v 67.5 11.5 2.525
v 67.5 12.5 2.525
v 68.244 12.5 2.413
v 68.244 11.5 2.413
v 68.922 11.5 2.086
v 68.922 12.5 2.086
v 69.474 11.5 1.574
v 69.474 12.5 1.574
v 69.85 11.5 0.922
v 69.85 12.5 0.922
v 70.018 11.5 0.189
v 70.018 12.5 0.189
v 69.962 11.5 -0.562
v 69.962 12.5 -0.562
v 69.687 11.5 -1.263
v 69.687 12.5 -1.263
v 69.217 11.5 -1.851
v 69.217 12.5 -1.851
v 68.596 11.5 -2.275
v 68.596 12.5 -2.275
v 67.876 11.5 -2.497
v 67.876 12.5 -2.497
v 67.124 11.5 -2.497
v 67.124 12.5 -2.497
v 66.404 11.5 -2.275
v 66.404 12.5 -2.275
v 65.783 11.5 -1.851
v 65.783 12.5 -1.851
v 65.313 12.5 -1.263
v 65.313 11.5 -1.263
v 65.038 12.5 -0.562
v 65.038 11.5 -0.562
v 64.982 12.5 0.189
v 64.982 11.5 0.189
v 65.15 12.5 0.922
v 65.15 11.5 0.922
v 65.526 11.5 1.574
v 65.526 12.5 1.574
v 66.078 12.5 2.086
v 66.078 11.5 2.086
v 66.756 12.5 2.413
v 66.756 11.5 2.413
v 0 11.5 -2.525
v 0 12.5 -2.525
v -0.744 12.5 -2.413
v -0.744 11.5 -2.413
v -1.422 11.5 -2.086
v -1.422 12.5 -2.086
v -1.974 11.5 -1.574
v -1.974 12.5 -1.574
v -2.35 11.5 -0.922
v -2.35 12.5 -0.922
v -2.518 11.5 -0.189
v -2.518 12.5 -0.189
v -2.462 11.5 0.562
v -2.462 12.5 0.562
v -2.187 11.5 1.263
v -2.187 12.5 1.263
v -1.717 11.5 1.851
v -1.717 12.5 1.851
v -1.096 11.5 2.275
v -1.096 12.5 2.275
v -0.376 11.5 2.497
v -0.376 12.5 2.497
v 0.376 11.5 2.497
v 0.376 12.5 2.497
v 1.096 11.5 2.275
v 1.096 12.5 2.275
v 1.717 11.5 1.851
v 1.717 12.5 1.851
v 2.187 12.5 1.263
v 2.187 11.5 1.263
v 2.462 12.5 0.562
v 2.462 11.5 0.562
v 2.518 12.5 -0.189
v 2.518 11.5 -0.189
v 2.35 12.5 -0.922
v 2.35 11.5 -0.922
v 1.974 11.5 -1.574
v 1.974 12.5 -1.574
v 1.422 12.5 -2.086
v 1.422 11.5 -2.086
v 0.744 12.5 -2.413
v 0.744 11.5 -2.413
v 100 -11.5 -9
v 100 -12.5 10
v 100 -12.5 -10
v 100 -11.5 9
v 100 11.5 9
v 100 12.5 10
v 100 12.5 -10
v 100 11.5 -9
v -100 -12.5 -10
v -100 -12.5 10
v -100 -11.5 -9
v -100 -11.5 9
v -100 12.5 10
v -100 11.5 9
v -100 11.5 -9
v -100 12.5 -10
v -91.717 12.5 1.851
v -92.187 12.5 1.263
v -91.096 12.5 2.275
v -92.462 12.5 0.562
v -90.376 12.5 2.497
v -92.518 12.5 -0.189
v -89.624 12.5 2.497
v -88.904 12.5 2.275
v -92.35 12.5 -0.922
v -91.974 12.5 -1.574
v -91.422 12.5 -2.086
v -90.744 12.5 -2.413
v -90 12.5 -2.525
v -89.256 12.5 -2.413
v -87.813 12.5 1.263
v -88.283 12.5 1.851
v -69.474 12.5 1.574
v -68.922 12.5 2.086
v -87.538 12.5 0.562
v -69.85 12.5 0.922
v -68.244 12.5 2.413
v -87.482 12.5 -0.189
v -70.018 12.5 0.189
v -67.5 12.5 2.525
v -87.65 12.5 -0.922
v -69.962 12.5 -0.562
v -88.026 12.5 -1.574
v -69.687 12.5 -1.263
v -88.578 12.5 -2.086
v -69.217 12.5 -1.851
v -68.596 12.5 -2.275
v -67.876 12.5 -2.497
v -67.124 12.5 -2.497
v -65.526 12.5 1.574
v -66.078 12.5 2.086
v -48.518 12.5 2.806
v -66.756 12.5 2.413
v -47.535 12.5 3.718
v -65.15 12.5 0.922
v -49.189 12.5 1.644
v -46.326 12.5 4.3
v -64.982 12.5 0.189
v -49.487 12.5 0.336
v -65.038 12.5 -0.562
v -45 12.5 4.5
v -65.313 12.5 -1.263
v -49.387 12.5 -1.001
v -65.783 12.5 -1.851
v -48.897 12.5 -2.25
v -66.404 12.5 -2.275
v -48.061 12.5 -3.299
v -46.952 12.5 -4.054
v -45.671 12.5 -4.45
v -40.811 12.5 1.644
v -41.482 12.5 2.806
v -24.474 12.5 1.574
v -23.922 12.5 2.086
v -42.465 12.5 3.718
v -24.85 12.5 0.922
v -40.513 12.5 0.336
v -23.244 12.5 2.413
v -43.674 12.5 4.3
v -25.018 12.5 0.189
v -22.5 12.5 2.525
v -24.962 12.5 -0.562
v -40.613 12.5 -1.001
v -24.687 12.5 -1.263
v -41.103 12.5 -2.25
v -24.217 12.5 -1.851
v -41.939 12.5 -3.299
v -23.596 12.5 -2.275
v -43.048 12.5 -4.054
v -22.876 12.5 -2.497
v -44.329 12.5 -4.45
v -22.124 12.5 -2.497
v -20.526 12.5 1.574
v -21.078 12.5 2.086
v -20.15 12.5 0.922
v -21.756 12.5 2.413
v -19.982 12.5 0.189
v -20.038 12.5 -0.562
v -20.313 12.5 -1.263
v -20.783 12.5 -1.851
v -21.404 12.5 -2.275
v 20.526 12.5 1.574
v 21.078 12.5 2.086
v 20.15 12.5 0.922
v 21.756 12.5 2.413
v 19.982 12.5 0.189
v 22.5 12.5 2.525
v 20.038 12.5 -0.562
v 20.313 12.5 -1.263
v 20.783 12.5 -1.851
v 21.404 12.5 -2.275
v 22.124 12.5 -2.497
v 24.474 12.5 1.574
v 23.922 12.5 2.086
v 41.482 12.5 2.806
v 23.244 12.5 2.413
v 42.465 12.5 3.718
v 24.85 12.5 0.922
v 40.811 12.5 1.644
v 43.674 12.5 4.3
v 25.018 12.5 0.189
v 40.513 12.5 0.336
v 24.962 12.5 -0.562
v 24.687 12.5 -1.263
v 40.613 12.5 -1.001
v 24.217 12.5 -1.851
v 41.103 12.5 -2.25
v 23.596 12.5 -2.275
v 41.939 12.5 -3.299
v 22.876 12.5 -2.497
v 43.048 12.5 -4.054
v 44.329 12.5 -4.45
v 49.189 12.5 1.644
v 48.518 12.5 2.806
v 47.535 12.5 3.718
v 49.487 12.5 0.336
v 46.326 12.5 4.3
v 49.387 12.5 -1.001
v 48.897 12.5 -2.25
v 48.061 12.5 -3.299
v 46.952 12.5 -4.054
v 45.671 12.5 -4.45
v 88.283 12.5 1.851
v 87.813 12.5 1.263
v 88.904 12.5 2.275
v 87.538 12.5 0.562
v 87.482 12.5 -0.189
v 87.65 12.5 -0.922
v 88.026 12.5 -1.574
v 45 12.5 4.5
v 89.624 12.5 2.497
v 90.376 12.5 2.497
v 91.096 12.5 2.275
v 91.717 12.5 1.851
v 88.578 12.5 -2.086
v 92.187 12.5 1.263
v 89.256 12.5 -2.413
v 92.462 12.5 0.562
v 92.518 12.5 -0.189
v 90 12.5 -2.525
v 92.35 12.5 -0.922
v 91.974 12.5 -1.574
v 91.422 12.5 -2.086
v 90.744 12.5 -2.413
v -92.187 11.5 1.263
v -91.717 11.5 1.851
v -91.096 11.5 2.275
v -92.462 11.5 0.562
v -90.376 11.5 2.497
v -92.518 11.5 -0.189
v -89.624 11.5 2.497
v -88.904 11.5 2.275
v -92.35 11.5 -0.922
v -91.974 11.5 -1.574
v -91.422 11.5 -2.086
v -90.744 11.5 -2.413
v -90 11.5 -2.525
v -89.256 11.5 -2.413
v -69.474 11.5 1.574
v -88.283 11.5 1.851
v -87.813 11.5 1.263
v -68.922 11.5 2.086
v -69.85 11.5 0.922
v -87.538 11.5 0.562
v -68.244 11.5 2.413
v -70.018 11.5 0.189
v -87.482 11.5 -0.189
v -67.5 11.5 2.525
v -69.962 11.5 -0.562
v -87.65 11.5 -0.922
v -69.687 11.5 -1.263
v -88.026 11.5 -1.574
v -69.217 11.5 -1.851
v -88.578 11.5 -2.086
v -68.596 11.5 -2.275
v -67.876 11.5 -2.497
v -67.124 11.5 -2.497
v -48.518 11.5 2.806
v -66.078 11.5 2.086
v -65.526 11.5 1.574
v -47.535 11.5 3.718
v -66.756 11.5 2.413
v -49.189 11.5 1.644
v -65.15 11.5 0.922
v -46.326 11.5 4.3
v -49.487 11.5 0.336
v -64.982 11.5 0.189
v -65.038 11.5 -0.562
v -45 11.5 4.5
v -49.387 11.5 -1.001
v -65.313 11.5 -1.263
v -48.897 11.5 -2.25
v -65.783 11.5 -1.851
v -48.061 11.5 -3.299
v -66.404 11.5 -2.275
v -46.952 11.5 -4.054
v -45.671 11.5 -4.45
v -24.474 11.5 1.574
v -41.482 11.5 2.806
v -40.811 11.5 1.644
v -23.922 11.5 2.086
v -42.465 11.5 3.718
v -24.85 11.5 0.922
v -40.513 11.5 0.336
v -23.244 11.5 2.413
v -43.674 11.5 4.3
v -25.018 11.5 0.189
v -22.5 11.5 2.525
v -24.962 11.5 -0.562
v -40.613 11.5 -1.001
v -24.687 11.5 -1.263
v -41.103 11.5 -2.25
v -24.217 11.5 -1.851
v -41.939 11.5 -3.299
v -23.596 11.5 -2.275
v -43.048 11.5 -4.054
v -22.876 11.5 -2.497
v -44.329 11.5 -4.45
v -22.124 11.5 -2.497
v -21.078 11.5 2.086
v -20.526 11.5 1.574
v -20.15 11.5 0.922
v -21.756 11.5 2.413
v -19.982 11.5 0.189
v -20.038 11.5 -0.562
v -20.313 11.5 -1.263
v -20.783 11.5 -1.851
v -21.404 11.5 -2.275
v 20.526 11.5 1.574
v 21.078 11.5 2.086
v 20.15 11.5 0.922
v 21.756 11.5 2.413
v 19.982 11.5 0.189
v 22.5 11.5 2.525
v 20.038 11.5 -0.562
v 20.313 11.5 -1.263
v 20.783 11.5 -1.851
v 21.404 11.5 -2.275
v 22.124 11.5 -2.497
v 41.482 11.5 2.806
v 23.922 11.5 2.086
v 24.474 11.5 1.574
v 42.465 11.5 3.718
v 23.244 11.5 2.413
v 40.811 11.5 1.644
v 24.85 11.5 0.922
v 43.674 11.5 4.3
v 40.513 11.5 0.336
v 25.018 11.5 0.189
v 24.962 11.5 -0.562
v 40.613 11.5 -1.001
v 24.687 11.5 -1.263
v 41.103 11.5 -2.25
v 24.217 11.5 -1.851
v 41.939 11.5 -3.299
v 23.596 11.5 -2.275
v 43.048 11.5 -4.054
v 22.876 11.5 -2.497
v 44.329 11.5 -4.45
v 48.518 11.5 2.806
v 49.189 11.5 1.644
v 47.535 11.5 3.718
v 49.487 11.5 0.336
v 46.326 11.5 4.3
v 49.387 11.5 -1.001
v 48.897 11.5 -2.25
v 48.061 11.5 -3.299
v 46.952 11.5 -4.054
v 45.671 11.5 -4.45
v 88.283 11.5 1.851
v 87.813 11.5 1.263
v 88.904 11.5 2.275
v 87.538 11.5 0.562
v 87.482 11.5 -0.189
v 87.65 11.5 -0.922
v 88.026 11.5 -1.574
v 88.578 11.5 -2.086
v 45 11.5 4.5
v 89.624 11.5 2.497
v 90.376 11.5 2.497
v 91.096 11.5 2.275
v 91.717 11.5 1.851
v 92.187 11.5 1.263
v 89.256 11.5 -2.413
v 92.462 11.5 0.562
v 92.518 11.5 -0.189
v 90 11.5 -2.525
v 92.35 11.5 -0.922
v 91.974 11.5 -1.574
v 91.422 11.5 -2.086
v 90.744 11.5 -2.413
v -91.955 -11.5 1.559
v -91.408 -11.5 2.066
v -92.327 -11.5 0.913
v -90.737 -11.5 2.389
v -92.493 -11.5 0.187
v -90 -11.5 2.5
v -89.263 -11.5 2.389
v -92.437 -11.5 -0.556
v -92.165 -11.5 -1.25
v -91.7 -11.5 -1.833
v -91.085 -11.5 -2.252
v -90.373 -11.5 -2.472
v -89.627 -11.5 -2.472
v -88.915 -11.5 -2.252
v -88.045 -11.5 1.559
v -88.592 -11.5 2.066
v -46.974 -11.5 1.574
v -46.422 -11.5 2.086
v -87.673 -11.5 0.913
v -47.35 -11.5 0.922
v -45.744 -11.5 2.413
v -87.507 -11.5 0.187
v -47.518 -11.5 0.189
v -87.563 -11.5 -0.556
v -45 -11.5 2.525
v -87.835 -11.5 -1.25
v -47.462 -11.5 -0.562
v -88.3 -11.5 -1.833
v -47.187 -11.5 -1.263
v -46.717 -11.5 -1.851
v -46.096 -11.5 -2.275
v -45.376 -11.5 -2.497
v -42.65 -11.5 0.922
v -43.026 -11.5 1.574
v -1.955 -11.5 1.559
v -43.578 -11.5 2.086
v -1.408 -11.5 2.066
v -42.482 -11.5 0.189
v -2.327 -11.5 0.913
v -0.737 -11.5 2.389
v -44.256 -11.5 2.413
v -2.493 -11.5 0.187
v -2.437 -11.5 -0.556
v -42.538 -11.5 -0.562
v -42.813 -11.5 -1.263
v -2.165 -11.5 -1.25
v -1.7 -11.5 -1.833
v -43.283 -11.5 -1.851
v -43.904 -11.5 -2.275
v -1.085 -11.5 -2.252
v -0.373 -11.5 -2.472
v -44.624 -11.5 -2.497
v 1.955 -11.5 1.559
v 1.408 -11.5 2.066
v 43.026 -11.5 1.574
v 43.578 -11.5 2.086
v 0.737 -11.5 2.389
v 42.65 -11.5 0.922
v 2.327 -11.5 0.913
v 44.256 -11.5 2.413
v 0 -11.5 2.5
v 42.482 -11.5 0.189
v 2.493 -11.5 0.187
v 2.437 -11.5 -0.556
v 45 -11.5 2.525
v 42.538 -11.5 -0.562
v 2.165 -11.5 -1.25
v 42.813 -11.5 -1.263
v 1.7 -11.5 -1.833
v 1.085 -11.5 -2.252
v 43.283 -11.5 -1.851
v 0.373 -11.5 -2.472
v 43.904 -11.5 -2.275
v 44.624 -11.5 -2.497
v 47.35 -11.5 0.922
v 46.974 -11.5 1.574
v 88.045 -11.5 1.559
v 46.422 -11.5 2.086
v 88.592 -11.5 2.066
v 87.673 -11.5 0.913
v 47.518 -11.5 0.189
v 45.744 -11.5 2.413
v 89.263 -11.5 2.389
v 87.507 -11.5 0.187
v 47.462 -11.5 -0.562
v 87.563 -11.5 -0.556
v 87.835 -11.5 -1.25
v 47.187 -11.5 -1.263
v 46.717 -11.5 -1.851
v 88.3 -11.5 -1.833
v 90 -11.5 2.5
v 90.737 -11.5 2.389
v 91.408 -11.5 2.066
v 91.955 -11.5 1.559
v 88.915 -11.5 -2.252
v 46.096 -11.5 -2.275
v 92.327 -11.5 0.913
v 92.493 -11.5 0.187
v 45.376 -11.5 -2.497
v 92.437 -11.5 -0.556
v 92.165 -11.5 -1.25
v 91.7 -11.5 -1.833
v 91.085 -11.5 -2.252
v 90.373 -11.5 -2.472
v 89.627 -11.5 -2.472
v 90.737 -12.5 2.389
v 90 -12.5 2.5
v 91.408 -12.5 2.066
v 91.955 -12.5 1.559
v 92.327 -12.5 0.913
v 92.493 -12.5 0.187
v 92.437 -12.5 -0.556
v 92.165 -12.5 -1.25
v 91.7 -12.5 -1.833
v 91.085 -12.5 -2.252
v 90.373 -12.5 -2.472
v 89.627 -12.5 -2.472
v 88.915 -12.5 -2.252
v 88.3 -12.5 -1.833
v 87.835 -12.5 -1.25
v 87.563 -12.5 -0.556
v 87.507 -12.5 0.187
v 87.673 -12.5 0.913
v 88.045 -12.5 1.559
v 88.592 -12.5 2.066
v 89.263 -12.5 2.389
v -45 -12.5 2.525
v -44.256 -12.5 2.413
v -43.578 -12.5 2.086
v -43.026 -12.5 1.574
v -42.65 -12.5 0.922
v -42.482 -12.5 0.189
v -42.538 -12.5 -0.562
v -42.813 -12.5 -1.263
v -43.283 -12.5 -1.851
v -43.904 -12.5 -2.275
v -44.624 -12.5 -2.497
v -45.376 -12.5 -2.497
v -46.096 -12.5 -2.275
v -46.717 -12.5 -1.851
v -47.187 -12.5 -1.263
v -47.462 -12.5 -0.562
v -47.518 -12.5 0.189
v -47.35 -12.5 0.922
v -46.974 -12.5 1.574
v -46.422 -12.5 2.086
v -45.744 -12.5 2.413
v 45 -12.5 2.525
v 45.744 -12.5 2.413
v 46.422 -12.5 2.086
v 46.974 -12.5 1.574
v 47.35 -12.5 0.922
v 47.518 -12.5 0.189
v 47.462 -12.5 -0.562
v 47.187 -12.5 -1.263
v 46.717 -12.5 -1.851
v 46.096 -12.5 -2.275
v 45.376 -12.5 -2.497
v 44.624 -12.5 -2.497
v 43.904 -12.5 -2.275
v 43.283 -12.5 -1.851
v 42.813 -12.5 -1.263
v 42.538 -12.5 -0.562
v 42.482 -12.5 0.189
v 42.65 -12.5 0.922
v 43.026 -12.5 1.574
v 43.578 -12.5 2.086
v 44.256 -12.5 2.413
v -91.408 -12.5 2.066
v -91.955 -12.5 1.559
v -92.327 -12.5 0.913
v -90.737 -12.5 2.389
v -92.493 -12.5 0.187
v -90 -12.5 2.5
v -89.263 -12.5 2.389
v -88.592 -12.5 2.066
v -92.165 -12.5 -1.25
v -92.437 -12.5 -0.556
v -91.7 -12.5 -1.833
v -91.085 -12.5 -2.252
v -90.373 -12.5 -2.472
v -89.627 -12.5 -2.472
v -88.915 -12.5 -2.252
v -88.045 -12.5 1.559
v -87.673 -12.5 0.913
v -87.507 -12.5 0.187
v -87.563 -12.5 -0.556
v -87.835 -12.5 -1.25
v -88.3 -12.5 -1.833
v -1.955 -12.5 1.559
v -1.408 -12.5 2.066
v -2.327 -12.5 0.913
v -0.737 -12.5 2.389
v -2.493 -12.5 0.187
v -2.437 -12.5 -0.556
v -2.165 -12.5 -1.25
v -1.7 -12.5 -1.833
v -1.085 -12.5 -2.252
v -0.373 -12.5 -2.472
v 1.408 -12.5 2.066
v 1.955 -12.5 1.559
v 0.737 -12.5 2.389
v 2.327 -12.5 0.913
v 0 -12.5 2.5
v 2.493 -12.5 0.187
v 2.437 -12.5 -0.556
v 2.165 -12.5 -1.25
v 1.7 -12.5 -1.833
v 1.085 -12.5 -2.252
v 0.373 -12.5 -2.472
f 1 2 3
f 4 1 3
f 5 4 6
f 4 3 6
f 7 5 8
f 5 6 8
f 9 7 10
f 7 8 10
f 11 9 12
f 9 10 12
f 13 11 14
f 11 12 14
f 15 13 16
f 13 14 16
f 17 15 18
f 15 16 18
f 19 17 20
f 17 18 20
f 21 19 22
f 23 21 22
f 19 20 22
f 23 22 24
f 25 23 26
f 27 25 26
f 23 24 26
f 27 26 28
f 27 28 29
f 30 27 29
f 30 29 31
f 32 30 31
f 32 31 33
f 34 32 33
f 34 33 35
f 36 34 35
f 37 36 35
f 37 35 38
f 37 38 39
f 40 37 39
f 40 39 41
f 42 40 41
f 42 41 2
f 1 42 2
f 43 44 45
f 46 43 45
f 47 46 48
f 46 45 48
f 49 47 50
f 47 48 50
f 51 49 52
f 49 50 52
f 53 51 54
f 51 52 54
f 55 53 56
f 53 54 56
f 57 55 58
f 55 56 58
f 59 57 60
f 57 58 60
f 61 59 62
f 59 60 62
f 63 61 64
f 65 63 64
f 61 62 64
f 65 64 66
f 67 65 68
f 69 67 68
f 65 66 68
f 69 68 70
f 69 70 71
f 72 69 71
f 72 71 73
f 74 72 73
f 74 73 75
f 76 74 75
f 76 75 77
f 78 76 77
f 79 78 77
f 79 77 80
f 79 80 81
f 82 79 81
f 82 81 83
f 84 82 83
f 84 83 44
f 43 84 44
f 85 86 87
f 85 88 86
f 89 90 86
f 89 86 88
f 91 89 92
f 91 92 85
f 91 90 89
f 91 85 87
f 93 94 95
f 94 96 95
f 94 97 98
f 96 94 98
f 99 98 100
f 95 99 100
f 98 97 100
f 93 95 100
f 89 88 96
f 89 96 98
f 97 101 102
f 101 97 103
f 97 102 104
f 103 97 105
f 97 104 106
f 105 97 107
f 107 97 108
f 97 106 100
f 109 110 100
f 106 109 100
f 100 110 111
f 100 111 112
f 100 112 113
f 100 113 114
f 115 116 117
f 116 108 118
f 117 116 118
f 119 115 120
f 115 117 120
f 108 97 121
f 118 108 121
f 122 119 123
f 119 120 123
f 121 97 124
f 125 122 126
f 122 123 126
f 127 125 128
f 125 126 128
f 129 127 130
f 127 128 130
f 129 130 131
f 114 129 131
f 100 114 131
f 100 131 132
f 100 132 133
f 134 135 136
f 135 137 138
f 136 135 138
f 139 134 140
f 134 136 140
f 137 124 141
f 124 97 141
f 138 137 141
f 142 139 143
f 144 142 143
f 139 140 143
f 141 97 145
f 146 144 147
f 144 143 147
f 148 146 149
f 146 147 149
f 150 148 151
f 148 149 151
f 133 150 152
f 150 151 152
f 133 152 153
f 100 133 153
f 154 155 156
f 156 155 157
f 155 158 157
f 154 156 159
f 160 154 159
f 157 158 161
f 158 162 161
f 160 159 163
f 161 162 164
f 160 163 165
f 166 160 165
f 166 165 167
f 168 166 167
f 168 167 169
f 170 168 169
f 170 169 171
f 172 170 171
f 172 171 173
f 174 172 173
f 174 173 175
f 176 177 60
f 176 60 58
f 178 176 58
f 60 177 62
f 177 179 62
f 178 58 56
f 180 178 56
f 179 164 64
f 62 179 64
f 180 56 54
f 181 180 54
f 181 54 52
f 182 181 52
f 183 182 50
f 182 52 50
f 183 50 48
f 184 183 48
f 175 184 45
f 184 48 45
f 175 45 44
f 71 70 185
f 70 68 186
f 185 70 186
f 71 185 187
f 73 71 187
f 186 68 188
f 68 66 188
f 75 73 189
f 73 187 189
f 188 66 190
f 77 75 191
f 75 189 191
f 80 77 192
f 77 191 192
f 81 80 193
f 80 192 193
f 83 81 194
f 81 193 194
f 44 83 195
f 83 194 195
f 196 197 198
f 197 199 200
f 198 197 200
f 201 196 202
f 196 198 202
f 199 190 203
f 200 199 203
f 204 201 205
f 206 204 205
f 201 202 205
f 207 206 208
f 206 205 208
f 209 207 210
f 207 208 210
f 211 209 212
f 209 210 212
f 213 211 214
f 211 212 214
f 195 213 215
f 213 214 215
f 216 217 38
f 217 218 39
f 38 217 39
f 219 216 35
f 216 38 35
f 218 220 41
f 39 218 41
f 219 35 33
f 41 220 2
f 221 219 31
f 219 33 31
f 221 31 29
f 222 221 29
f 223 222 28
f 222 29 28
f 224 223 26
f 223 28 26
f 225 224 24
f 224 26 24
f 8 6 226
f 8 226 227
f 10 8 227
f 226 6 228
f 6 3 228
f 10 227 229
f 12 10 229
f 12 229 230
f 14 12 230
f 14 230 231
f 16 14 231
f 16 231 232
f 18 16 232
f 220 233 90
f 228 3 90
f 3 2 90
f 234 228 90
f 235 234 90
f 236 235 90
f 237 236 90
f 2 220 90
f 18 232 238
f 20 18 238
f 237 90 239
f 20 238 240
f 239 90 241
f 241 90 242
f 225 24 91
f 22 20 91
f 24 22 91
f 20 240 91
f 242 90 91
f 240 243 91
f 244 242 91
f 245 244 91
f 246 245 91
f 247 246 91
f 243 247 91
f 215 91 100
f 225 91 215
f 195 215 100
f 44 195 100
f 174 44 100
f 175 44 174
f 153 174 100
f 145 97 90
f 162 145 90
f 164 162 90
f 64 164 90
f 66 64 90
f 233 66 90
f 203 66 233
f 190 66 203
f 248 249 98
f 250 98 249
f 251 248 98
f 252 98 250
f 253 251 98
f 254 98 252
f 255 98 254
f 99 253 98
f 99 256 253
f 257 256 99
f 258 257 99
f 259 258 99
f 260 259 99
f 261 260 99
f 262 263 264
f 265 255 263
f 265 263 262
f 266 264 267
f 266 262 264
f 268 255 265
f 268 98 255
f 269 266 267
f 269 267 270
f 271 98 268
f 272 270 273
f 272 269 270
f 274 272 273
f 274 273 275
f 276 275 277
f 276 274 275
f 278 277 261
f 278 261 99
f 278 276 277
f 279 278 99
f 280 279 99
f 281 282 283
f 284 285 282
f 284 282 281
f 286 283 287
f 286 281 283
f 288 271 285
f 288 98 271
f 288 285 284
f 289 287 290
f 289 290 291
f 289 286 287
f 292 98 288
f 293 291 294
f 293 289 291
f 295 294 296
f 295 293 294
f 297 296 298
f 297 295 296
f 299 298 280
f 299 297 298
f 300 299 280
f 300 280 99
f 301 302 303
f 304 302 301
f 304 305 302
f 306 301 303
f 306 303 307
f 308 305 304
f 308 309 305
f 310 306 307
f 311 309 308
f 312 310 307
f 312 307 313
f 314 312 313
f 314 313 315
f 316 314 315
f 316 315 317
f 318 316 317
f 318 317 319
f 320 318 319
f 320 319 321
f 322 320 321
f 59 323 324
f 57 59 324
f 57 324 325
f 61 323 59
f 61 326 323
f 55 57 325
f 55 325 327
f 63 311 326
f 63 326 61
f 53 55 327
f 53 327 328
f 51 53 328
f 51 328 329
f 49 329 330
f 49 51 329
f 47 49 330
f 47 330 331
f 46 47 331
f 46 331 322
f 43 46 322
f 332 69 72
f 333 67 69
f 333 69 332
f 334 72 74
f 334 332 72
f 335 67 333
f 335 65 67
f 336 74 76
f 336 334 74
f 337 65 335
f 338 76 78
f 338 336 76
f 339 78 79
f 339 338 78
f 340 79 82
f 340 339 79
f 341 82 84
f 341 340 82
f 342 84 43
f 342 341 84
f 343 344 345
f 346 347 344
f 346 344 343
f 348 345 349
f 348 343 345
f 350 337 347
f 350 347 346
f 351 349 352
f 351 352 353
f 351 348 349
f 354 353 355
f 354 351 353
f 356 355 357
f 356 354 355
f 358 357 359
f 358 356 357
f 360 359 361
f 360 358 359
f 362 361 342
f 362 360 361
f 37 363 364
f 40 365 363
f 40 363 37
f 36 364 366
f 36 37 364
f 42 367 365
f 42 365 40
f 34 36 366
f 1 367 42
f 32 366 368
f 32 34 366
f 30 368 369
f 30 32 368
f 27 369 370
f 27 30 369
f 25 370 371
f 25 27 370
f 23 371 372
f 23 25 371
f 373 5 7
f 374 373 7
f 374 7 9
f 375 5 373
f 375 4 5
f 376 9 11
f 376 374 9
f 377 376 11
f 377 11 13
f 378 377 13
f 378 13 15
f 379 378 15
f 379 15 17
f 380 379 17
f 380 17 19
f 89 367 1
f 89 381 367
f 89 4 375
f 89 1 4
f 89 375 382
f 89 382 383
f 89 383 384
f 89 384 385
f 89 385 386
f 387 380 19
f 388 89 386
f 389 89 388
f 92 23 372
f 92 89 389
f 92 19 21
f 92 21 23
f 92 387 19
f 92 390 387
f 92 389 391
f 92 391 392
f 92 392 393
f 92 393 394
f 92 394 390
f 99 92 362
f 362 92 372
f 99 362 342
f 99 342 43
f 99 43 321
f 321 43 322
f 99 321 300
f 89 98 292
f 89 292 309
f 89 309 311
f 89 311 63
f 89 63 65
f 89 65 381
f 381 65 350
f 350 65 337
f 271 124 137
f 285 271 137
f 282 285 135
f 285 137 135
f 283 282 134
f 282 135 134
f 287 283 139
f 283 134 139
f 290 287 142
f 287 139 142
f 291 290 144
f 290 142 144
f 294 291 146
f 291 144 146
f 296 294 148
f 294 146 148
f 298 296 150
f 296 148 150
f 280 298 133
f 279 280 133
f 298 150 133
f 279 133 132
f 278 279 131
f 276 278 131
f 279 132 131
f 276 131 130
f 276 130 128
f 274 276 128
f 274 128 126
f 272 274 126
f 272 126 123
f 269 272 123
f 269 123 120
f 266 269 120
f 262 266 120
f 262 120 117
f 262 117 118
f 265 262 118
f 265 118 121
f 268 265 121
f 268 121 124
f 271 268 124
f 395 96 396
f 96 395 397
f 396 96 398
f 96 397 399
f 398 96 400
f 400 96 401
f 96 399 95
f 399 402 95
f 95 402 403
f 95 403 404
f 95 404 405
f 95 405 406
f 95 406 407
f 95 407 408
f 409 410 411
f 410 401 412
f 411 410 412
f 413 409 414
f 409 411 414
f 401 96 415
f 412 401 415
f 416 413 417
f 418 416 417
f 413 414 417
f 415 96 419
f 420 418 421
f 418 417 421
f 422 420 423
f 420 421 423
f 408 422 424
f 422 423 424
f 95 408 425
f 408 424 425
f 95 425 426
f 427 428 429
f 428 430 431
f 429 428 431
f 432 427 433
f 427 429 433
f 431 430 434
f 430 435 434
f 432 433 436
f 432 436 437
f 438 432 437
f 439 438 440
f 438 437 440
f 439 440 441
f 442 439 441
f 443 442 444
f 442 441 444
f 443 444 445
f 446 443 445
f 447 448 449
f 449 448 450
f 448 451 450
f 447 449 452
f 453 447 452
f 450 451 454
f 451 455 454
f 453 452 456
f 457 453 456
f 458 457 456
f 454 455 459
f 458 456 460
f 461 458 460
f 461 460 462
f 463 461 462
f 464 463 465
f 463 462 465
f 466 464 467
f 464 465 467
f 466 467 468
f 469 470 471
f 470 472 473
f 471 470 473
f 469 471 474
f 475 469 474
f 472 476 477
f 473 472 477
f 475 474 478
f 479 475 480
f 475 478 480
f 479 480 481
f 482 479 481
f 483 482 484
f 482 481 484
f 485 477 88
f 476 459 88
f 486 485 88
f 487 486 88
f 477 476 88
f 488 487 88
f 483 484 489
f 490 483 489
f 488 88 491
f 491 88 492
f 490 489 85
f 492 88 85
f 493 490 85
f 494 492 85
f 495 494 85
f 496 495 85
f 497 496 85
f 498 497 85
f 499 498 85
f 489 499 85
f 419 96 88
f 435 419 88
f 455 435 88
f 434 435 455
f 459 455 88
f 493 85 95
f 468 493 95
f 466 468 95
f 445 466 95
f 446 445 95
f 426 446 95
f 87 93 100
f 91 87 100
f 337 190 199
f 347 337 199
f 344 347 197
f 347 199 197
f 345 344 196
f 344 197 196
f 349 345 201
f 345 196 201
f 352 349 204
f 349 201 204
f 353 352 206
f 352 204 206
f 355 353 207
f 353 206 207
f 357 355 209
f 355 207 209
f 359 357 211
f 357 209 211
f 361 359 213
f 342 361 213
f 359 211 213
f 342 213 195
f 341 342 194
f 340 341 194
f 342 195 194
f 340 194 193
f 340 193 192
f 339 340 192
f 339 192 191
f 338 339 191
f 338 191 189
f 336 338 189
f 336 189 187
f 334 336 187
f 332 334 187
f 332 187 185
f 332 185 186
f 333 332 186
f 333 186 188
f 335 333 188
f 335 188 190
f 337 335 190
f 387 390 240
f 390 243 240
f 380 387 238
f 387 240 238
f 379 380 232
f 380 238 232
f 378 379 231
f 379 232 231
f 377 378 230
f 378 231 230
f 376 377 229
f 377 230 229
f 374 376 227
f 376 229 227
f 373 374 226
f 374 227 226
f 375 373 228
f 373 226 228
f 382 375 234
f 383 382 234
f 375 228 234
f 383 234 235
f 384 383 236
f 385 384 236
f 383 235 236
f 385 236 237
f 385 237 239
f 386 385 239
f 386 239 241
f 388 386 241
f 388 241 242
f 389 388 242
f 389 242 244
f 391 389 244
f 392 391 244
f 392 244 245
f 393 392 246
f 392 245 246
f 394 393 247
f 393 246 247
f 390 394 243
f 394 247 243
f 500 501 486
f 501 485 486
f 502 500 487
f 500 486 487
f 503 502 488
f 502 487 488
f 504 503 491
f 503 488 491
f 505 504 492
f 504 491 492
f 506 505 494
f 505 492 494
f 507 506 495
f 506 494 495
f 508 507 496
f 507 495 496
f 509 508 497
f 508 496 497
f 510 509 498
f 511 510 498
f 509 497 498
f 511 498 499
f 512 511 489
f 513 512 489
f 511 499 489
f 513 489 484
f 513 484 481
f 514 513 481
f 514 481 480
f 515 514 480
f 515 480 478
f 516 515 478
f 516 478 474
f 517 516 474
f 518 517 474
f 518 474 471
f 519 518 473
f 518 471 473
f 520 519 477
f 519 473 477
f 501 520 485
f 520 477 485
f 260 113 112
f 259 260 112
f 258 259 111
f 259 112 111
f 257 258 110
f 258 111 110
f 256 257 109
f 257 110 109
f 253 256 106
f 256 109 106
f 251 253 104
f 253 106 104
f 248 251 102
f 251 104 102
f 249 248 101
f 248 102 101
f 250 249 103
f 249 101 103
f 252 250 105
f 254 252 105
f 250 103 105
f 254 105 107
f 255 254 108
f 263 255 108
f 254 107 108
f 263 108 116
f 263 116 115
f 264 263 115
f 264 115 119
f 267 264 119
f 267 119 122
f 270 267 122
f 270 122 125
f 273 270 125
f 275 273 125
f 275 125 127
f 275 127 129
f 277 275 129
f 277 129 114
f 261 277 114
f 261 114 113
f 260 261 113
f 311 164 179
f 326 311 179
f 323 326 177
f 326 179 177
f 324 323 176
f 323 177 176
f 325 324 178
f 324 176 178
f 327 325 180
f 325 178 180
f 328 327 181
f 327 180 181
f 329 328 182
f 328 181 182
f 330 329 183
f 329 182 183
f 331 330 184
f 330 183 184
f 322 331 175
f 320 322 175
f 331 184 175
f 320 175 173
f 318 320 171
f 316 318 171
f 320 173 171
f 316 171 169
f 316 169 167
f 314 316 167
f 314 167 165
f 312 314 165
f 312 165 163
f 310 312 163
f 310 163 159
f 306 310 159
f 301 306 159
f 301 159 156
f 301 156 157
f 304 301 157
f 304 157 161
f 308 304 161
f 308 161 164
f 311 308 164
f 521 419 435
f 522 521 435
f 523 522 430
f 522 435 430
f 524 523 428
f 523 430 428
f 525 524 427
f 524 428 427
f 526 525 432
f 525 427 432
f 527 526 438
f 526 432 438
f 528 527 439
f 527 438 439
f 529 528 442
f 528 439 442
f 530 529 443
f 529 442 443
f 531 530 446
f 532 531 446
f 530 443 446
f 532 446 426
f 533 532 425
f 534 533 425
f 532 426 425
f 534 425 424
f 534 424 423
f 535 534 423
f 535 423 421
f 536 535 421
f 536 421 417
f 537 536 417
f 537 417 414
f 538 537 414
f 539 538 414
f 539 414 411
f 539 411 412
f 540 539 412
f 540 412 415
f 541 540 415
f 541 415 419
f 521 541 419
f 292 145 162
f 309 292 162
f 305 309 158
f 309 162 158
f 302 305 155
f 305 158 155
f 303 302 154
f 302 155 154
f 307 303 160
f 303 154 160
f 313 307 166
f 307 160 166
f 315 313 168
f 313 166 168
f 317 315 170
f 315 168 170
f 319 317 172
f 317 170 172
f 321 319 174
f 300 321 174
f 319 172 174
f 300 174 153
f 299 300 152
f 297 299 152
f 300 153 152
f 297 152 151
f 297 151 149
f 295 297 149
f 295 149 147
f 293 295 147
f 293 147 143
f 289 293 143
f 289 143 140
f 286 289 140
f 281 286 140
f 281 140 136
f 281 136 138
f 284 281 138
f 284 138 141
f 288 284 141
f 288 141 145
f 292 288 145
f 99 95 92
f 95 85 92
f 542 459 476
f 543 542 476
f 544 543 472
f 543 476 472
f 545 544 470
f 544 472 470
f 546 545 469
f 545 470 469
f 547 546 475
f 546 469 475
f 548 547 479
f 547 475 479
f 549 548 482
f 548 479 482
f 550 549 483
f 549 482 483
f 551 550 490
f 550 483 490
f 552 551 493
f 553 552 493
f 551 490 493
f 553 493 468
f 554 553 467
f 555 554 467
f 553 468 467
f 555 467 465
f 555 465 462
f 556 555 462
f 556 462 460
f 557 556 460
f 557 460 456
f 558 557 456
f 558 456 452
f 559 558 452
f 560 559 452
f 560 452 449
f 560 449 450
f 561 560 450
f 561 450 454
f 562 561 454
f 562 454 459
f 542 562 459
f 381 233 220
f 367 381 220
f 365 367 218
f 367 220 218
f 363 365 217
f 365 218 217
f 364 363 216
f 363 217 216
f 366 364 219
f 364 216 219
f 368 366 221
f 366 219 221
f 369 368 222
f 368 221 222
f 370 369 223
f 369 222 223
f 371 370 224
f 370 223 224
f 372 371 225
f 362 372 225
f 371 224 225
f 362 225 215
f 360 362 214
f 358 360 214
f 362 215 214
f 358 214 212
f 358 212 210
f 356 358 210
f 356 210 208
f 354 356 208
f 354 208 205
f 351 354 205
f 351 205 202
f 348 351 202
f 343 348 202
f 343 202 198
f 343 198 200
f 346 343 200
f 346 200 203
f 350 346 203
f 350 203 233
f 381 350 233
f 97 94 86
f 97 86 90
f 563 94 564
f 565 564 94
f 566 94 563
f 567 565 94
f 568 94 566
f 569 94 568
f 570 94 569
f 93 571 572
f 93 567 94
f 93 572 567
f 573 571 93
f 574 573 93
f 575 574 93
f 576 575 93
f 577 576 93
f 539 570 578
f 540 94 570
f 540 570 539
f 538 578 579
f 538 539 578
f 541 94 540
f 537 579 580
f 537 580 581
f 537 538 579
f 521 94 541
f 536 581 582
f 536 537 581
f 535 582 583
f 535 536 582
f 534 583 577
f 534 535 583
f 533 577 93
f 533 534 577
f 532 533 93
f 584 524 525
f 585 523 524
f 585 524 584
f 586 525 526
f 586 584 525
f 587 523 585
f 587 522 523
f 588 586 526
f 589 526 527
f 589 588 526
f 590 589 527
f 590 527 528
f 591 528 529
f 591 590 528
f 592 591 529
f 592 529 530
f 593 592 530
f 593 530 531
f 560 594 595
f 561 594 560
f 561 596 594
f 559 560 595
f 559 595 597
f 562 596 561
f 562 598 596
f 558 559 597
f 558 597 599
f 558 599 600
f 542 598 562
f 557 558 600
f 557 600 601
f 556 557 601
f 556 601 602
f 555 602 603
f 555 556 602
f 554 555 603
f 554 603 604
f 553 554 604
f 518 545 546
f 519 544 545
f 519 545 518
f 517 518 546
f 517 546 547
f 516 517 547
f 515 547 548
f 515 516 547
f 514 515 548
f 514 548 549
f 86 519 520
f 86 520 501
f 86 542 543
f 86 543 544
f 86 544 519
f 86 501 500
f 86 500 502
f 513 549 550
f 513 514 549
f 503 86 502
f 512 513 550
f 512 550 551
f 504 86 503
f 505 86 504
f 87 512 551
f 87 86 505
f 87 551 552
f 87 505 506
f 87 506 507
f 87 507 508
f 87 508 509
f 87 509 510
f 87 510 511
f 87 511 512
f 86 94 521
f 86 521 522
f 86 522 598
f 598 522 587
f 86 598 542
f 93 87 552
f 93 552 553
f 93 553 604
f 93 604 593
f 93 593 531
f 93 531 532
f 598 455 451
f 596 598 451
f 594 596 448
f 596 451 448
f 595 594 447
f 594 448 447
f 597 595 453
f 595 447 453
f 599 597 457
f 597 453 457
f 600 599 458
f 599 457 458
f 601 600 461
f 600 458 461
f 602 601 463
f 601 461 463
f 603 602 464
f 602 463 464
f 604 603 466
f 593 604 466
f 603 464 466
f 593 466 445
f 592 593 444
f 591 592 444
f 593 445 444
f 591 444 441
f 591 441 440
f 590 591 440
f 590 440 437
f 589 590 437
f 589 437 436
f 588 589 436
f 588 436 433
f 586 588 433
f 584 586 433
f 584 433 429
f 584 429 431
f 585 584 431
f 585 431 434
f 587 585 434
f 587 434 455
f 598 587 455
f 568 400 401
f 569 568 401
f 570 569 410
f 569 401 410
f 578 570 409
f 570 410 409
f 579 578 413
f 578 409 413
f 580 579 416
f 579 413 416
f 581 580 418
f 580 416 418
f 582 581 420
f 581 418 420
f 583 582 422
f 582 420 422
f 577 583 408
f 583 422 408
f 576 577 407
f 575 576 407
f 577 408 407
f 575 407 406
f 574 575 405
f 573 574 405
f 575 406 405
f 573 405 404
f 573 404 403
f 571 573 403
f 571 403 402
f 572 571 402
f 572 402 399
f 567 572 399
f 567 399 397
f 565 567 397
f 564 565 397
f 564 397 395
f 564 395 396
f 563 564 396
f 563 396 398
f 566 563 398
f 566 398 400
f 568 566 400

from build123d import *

# Parameters (mm, degrees)
SKETCH_1_W          = 20
SKETCH_1_H          = 25
SKETCH_1_W_2        = 18
SKETCH_1_H_2        = 23
EXTRUDE_1_DEPTH     = 100
SKETCH_2_R          = 2.525
CUT_EXTRUDE_1_DEPTH = 5
SKETCH_4_R          = 2.5
CUT_EXTRUDE_3_DEPTH = 5
SKETCH_5_R          = 4.5
CUT_EXTRUDE_4_DEPTH = 2
SKETCH_6_R          = 2.525
CUT_EXTRUDE_5_DEPTH = 2
SKETCH_7_R          = 2.525
CUT_EXTRUDE_6_DEPTH = 10


with BuildPart() as part:
    # 草图1 → 凸台-拉伸1 (new, symmetric)
    with BuildSketch(Plane(origin=(0, 0, 0), x_dir=(0, 0, -1), z_dir=(1, 0, 0))):
        Rectangle(SKETCH_1_W, SKETCH_1_H)
        Rectangle(SKETCH_1_W_2, SKETCH_1_H_2, mode=Mode.SUBTRACT)
    extrude(amount=EXTRUDE_1_DEPTH, both=True)

    # 草图2 → 切除-拉伸1 (cut, symmetric)
    with BuildSketch(Plane(origin=(0, 12.5, 0), x_dir=(1, 0, 0), z_dir=(0, 1, 0))):
        with Locations(Location((0, 0, 0), (0, 0, 90))):
            Circle(SKETCH_2_R)
        with Locations(Location((-90, 0, 0), (0, 0, 90))):
            Circle(SKETCH_2_R)
        with Locations(Location((90, 0, 0), (0, 0, 90))):
            Circle(SKETCH_2_R)
    extrude(amount=CUT_EXTRUDE_1_DEPTH, both=True, mode=Mode.SUBTRACT)

    # 草图4 → 切除-拉伸3 (cut, symmetric)
    with BuildSketch(Plane(origin=(0, -11.5, 0), x_dir=(1, 0, 0), z_dir=(0, 1, 0))):
        with Locations(Location((-90, 0, 0), (0, 0, 270))):
            Circle(SKETCH_4_R)
        with Locations(Location((0, 0, 0), (0, 0, 270))):
            Circle(SKETCH_4_R)
        with Locations(Location((90, 0, 0), (0, 0, 270))):
            Circle(SKETCH_4_R)
    extrude(amount=CUT_EXTRUDE_3_DEPTH, both=True, mode=Mode.SUBTRACT)

    # 草图5 → 切除-拉伸4 (cut)
    with BuildSketch(Plane(origin=(0, 12.5, 0), x_dir=(1, 0, 0), z_dir=(0, 1, 0))):
        with Locations(Location((-45, 0, 0), (0, 0, 270))):
            Circle(SKETCH_5_R)
        with Locations(Location((45, 0, 0), (0, 0, 270))):
            Circle(SKETCH_5_R)
    extrude(amount=-CUT_EXTRUDE_4_DEPTH, mode=Mode.SUBTRACT)

    # 草图6 → 切除-拉伸5 (cut)
    with BuildSketch(Plane(origin=(0, -11.5, 0), x_dir=(1, 0, 0), z_dir=(0, 1, 0))):
        with Locations(Location((-45, 0, 0), (0, 0, 270))):
            Circle(SKETCH_6_R)
        with Locations(Location((45, 0, 0), (0, 0, 270))):
            Circle(SKETCH_6_R)
    extrude(amount=-CUT_EXTRUDE_5_DEPTH, mode=Mode.SUBTRACT)

    # 草图7 → 切除-拉伸6 (cut)
    with BuildSketch(Plane(origin=(0, 12.5, 0), x_dir=(1, 0, 0), z_dir=(0, 1, 0))):
        with Locations(Location((-67.5, 0, 0), (0, 0, 270))):
            Circle(SKETCH_7_R)
        with Locations(Location((-22.5, 0, 0), (0, 0, 270))):
            Circle(SKETCH_7_R)
        with Locations(Location((22.5, 0, 0), (0, 0, 270))):
            Circle(SKETCH_7_R)
        with Locations(Location((67.5, 0, 0), (0, 0, 270))):
            Circle(SKETCH_7_R)
    extrude(amount=-CUT_EXTRUDE_6_DEPTH, mode=Mode.SUBTRACT)


solid = part.part
